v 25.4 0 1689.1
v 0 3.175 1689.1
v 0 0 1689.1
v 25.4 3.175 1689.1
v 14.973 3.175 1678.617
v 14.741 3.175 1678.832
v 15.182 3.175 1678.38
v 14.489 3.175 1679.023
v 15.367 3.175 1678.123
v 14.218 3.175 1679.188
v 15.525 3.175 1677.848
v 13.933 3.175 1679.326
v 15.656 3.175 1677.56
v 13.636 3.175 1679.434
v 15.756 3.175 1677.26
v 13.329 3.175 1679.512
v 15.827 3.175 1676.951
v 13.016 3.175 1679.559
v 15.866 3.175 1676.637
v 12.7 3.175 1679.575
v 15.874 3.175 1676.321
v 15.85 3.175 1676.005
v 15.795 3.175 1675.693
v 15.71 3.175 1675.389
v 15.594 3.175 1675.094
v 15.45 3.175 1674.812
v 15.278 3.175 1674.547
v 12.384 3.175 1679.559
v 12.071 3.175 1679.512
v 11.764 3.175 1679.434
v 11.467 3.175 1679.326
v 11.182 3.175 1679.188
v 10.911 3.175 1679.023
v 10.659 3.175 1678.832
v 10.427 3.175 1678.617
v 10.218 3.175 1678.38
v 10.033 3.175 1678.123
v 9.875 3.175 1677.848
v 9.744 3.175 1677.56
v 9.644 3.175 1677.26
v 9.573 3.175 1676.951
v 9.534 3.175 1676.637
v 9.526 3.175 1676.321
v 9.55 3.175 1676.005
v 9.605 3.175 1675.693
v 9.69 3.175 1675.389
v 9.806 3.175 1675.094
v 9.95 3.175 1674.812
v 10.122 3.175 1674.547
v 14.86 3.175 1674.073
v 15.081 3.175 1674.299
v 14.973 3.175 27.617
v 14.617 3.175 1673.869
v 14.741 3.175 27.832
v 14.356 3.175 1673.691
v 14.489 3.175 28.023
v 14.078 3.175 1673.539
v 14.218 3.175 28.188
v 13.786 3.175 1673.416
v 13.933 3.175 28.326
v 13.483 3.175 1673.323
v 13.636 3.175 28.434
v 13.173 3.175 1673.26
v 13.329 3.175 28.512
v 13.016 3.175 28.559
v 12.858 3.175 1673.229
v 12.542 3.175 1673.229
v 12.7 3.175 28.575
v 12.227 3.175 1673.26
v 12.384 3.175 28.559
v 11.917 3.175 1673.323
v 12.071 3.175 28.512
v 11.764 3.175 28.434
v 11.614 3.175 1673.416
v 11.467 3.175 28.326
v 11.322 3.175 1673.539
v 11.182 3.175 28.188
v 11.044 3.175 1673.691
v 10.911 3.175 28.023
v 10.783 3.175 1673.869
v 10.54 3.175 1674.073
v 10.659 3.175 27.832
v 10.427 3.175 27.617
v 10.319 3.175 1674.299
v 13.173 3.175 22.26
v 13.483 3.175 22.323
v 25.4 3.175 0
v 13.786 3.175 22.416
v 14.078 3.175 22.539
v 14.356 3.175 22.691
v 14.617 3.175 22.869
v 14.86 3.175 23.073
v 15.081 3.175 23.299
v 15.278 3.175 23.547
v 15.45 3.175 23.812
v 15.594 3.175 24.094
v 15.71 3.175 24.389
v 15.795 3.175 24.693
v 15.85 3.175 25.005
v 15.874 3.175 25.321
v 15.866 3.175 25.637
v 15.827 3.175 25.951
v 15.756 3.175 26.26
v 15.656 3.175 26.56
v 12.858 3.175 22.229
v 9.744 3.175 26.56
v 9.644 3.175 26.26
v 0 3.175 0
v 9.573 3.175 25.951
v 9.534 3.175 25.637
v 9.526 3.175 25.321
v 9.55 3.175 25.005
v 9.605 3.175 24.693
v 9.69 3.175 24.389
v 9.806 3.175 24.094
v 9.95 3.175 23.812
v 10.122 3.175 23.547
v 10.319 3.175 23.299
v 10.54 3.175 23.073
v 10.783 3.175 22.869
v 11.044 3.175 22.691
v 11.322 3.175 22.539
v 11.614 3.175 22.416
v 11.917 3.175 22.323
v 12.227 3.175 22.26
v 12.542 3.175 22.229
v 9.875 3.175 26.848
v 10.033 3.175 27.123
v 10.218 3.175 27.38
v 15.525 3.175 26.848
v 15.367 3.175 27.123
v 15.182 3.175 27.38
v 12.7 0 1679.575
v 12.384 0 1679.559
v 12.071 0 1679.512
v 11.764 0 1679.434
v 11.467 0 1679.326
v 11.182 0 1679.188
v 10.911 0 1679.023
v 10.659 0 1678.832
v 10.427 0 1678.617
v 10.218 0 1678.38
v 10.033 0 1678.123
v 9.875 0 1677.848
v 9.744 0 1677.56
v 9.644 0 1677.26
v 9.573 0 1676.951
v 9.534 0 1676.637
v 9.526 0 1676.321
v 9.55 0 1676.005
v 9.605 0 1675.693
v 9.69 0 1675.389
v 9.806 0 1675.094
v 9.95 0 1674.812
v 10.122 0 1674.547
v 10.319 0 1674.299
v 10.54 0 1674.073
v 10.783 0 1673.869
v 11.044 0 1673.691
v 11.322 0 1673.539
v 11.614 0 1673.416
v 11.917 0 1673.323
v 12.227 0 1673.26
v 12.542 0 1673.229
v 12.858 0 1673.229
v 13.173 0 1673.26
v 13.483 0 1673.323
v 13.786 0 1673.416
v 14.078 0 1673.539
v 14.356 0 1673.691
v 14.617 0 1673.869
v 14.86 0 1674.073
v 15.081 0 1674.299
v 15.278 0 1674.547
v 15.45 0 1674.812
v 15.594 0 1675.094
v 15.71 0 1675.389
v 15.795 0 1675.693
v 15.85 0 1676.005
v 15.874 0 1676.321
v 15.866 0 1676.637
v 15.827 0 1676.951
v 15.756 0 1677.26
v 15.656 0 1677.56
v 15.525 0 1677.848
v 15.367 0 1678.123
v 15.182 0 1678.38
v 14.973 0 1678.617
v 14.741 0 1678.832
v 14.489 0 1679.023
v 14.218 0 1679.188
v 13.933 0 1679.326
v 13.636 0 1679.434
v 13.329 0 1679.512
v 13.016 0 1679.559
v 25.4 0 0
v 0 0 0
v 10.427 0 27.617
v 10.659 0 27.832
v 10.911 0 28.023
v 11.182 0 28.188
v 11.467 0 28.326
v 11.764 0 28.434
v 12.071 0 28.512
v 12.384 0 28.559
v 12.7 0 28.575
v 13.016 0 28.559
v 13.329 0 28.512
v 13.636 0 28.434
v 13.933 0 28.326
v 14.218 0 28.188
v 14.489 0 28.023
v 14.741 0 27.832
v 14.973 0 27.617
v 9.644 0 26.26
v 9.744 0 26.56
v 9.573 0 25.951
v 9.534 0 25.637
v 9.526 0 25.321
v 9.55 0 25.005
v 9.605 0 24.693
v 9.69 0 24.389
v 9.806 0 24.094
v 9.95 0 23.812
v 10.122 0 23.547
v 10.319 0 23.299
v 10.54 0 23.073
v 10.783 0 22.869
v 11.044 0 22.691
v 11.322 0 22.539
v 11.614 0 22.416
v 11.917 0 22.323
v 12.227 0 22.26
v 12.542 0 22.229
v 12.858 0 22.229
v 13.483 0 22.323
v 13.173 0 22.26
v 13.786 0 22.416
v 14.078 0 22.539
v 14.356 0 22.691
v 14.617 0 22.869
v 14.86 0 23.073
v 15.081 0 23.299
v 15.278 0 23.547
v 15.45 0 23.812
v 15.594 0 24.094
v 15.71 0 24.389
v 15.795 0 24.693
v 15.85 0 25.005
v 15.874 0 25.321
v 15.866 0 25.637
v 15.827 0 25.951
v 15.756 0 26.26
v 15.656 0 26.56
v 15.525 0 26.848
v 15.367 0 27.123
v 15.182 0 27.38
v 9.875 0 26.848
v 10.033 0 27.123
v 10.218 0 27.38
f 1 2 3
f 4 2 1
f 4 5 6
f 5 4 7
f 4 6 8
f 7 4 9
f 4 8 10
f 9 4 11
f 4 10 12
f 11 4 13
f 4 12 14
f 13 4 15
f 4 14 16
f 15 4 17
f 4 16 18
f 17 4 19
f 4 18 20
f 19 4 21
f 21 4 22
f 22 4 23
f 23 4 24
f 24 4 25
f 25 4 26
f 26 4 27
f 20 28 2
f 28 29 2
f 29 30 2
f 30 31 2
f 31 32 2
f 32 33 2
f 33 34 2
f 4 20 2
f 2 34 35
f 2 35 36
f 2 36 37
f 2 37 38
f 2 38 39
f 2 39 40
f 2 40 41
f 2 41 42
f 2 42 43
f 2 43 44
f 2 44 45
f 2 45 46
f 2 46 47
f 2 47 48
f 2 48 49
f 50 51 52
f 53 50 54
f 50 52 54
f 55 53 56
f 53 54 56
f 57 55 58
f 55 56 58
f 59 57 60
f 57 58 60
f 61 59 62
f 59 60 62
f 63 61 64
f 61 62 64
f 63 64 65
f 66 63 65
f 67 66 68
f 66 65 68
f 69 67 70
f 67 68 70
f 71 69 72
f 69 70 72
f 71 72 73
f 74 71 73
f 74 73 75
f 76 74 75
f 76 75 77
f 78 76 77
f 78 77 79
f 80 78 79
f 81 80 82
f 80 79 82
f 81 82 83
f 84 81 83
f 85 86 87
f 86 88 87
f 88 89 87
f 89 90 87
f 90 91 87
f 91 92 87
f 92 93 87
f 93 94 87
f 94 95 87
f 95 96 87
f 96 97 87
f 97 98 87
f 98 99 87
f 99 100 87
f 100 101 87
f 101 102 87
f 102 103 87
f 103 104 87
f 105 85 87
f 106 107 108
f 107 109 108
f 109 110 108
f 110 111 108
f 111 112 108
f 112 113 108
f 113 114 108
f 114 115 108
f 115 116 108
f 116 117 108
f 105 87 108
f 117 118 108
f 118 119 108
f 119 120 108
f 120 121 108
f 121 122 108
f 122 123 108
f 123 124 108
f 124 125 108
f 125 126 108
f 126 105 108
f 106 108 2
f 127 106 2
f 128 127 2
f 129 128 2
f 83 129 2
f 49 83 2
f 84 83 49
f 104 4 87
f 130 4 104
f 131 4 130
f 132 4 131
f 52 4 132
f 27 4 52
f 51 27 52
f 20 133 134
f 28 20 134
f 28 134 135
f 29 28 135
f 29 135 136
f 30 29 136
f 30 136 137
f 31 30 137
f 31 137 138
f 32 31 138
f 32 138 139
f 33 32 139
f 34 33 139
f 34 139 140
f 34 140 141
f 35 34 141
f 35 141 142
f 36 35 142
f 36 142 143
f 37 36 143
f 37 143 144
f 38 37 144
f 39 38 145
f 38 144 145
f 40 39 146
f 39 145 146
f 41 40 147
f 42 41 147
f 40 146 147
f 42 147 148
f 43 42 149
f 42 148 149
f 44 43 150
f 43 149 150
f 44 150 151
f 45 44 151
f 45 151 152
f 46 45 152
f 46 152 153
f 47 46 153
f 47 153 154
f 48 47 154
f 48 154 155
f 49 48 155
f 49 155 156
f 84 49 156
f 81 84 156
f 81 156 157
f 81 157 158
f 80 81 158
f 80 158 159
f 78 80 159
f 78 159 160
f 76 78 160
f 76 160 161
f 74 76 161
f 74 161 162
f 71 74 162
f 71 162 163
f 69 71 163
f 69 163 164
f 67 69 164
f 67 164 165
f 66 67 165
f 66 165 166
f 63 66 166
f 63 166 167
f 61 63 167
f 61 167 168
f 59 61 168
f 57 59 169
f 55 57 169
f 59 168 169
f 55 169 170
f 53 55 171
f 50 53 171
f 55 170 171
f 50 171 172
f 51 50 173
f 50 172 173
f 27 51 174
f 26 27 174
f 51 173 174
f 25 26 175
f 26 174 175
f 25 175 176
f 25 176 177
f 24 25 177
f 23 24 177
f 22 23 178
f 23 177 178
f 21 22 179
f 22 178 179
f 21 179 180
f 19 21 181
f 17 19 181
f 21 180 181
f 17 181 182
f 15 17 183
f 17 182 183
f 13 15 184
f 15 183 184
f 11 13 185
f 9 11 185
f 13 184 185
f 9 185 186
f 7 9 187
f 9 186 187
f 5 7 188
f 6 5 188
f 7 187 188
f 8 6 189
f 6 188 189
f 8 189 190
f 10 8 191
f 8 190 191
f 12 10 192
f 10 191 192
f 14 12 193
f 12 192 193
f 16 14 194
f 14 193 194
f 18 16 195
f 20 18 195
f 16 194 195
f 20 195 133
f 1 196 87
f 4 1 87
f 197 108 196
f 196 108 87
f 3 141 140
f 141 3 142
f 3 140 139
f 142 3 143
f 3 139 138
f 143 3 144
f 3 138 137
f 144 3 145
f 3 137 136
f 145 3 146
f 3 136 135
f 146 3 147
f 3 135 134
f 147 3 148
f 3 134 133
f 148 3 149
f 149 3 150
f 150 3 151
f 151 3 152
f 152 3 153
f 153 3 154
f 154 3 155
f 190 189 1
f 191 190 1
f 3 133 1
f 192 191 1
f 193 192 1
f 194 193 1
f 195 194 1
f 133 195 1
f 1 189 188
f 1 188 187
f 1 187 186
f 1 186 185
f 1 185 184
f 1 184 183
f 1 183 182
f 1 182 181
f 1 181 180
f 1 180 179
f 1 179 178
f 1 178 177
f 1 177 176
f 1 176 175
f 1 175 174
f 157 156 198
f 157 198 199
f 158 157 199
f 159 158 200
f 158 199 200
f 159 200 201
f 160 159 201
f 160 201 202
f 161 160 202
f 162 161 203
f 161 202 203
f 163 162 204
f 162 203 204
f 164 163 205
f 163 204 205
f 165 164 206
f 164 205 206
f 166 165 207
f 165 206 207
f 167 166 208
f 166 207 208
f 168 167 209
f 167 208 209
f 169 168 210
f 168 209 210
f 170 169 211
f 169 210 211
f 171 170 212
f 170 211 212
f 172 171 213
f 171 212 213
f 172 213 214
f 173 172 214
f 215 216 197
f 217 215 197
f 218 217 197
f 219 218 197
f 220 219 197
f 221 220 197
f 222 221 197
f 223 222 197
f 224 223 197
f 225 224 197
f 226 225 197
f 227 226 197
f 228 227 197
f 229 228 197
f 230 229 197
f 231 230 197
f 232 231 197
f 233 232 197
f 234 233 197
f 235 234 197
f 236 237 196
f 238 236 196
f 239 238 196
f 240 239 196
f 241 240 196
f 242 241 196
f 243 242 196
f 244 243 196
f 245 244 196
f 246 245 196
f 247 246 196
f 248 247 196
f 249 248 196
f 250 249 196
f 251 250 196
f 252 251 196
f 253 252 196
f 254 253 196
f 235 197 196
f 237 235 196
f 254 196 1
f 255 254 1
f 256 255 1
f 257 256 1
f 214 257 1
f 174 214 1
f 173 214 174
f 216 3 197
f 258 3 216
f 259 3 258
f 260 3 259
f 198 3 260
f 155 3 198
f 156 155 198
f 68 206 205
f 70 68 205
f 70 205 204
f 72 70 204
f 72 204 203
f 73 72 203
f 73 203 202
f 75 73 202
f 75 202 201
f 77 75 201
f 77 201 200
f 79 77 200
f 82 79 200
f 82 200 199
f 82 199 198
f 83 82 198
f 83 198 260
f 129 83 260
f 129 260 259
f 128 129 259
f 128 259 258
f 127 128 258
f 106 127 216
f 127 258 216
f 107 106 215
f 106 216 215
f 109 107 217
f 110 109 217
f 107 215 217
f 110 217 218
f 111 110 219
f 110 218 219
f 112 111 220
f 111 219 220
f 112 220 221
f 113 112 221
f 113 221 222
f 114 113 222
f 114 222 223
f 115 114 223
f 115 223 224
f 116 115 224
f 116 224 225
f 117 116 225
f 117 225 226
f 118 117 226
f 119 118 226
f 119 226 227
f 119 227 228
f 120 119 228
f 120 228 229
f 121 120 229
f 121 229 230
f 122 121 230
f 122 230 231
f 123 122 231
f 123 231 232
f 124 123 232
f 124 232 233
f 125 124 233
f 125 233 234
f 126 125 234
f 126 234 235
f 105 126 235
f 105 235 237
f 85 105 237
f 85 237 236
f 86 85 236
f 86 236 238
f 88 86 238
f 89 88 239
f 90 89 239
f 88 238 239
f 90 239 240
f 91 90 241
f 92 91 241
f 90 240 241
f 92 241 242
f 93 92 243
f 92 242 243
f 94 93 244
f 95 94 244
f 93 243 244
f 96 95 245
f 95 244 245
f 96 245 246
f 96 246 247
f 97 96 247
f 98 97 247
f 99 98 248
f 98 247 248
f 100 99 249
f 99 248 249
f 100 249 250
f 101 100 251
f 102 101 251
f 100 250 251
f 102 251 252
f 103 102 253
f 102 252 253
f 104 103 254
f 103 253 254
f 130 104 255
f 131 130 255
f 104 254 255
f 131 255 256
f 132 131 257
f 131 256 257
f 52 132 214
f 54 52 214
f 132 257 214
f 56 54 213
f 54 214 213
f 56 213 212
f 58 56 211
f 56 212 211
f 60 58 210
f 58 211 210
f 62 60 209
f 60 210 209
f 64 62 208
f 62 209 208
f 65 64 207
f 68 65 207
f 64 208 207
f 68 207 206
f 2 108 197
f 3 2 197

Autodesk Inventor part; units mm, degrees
ref_plane "YZ Plane" through (0, 0, 0) normal (1, 0, 0) x (0, 1, 0)
ref_plane "XZ Plane" through (0, 0, 0) normal (0, 1, 0) x (-1, 0, 0)
ref_plane "XY Plane" through (0, 0, 0) normal (0, 0, 1) x (1, 0, 0)
sketch "Sketch1" plane through (0, 0, 0) normal (0, 0, 1) x (1, 0, 0)
  line L0 (0, 0) -> (25.4, 0)
  line L1 (25.4, 0) -> (25.4, 3.175)
  line L2 (25.4, 3.175) -> (0, 3.175)
  line L3 (0, 3.175) -> (0, 0)
  dimension "d0" = 25.4
  dimension "d1" = 3.175
extrude "Extrusion1" add sketch "Sketch1" along normal blind 1689.1
sketch "Sketch2" plane through (0, 3.175, 1689.1) normal (0, 1, 0) x (1, 0, 0)
  line L0 (25.4, 1689.1) -> (0, 1689.1) projected
  line L1 (0, 1689.1) -> (0, 0) projected
  line L2 (25.4, 0) -> (0, 0) projected
  line L3 (25.4, 1689.1) -> (25.4, 0) projected
  point P0 (12.7, 1663.7)
  point P1 (12.7, 12.7)
  dimension "d4" = 12.7
  dimension "d5" = 12.7
  dimension "d6" = 12.7
  dimension "d7" = 25.4
hole "Hole1" at (12.7, 3.175, 25.4) at (12.7, 3.175, 1676.4) direction (0, -1, 0) diameter 6.35 end through all
properties part number "rail aligner" material "Nylon, molybdenum disulphide"
